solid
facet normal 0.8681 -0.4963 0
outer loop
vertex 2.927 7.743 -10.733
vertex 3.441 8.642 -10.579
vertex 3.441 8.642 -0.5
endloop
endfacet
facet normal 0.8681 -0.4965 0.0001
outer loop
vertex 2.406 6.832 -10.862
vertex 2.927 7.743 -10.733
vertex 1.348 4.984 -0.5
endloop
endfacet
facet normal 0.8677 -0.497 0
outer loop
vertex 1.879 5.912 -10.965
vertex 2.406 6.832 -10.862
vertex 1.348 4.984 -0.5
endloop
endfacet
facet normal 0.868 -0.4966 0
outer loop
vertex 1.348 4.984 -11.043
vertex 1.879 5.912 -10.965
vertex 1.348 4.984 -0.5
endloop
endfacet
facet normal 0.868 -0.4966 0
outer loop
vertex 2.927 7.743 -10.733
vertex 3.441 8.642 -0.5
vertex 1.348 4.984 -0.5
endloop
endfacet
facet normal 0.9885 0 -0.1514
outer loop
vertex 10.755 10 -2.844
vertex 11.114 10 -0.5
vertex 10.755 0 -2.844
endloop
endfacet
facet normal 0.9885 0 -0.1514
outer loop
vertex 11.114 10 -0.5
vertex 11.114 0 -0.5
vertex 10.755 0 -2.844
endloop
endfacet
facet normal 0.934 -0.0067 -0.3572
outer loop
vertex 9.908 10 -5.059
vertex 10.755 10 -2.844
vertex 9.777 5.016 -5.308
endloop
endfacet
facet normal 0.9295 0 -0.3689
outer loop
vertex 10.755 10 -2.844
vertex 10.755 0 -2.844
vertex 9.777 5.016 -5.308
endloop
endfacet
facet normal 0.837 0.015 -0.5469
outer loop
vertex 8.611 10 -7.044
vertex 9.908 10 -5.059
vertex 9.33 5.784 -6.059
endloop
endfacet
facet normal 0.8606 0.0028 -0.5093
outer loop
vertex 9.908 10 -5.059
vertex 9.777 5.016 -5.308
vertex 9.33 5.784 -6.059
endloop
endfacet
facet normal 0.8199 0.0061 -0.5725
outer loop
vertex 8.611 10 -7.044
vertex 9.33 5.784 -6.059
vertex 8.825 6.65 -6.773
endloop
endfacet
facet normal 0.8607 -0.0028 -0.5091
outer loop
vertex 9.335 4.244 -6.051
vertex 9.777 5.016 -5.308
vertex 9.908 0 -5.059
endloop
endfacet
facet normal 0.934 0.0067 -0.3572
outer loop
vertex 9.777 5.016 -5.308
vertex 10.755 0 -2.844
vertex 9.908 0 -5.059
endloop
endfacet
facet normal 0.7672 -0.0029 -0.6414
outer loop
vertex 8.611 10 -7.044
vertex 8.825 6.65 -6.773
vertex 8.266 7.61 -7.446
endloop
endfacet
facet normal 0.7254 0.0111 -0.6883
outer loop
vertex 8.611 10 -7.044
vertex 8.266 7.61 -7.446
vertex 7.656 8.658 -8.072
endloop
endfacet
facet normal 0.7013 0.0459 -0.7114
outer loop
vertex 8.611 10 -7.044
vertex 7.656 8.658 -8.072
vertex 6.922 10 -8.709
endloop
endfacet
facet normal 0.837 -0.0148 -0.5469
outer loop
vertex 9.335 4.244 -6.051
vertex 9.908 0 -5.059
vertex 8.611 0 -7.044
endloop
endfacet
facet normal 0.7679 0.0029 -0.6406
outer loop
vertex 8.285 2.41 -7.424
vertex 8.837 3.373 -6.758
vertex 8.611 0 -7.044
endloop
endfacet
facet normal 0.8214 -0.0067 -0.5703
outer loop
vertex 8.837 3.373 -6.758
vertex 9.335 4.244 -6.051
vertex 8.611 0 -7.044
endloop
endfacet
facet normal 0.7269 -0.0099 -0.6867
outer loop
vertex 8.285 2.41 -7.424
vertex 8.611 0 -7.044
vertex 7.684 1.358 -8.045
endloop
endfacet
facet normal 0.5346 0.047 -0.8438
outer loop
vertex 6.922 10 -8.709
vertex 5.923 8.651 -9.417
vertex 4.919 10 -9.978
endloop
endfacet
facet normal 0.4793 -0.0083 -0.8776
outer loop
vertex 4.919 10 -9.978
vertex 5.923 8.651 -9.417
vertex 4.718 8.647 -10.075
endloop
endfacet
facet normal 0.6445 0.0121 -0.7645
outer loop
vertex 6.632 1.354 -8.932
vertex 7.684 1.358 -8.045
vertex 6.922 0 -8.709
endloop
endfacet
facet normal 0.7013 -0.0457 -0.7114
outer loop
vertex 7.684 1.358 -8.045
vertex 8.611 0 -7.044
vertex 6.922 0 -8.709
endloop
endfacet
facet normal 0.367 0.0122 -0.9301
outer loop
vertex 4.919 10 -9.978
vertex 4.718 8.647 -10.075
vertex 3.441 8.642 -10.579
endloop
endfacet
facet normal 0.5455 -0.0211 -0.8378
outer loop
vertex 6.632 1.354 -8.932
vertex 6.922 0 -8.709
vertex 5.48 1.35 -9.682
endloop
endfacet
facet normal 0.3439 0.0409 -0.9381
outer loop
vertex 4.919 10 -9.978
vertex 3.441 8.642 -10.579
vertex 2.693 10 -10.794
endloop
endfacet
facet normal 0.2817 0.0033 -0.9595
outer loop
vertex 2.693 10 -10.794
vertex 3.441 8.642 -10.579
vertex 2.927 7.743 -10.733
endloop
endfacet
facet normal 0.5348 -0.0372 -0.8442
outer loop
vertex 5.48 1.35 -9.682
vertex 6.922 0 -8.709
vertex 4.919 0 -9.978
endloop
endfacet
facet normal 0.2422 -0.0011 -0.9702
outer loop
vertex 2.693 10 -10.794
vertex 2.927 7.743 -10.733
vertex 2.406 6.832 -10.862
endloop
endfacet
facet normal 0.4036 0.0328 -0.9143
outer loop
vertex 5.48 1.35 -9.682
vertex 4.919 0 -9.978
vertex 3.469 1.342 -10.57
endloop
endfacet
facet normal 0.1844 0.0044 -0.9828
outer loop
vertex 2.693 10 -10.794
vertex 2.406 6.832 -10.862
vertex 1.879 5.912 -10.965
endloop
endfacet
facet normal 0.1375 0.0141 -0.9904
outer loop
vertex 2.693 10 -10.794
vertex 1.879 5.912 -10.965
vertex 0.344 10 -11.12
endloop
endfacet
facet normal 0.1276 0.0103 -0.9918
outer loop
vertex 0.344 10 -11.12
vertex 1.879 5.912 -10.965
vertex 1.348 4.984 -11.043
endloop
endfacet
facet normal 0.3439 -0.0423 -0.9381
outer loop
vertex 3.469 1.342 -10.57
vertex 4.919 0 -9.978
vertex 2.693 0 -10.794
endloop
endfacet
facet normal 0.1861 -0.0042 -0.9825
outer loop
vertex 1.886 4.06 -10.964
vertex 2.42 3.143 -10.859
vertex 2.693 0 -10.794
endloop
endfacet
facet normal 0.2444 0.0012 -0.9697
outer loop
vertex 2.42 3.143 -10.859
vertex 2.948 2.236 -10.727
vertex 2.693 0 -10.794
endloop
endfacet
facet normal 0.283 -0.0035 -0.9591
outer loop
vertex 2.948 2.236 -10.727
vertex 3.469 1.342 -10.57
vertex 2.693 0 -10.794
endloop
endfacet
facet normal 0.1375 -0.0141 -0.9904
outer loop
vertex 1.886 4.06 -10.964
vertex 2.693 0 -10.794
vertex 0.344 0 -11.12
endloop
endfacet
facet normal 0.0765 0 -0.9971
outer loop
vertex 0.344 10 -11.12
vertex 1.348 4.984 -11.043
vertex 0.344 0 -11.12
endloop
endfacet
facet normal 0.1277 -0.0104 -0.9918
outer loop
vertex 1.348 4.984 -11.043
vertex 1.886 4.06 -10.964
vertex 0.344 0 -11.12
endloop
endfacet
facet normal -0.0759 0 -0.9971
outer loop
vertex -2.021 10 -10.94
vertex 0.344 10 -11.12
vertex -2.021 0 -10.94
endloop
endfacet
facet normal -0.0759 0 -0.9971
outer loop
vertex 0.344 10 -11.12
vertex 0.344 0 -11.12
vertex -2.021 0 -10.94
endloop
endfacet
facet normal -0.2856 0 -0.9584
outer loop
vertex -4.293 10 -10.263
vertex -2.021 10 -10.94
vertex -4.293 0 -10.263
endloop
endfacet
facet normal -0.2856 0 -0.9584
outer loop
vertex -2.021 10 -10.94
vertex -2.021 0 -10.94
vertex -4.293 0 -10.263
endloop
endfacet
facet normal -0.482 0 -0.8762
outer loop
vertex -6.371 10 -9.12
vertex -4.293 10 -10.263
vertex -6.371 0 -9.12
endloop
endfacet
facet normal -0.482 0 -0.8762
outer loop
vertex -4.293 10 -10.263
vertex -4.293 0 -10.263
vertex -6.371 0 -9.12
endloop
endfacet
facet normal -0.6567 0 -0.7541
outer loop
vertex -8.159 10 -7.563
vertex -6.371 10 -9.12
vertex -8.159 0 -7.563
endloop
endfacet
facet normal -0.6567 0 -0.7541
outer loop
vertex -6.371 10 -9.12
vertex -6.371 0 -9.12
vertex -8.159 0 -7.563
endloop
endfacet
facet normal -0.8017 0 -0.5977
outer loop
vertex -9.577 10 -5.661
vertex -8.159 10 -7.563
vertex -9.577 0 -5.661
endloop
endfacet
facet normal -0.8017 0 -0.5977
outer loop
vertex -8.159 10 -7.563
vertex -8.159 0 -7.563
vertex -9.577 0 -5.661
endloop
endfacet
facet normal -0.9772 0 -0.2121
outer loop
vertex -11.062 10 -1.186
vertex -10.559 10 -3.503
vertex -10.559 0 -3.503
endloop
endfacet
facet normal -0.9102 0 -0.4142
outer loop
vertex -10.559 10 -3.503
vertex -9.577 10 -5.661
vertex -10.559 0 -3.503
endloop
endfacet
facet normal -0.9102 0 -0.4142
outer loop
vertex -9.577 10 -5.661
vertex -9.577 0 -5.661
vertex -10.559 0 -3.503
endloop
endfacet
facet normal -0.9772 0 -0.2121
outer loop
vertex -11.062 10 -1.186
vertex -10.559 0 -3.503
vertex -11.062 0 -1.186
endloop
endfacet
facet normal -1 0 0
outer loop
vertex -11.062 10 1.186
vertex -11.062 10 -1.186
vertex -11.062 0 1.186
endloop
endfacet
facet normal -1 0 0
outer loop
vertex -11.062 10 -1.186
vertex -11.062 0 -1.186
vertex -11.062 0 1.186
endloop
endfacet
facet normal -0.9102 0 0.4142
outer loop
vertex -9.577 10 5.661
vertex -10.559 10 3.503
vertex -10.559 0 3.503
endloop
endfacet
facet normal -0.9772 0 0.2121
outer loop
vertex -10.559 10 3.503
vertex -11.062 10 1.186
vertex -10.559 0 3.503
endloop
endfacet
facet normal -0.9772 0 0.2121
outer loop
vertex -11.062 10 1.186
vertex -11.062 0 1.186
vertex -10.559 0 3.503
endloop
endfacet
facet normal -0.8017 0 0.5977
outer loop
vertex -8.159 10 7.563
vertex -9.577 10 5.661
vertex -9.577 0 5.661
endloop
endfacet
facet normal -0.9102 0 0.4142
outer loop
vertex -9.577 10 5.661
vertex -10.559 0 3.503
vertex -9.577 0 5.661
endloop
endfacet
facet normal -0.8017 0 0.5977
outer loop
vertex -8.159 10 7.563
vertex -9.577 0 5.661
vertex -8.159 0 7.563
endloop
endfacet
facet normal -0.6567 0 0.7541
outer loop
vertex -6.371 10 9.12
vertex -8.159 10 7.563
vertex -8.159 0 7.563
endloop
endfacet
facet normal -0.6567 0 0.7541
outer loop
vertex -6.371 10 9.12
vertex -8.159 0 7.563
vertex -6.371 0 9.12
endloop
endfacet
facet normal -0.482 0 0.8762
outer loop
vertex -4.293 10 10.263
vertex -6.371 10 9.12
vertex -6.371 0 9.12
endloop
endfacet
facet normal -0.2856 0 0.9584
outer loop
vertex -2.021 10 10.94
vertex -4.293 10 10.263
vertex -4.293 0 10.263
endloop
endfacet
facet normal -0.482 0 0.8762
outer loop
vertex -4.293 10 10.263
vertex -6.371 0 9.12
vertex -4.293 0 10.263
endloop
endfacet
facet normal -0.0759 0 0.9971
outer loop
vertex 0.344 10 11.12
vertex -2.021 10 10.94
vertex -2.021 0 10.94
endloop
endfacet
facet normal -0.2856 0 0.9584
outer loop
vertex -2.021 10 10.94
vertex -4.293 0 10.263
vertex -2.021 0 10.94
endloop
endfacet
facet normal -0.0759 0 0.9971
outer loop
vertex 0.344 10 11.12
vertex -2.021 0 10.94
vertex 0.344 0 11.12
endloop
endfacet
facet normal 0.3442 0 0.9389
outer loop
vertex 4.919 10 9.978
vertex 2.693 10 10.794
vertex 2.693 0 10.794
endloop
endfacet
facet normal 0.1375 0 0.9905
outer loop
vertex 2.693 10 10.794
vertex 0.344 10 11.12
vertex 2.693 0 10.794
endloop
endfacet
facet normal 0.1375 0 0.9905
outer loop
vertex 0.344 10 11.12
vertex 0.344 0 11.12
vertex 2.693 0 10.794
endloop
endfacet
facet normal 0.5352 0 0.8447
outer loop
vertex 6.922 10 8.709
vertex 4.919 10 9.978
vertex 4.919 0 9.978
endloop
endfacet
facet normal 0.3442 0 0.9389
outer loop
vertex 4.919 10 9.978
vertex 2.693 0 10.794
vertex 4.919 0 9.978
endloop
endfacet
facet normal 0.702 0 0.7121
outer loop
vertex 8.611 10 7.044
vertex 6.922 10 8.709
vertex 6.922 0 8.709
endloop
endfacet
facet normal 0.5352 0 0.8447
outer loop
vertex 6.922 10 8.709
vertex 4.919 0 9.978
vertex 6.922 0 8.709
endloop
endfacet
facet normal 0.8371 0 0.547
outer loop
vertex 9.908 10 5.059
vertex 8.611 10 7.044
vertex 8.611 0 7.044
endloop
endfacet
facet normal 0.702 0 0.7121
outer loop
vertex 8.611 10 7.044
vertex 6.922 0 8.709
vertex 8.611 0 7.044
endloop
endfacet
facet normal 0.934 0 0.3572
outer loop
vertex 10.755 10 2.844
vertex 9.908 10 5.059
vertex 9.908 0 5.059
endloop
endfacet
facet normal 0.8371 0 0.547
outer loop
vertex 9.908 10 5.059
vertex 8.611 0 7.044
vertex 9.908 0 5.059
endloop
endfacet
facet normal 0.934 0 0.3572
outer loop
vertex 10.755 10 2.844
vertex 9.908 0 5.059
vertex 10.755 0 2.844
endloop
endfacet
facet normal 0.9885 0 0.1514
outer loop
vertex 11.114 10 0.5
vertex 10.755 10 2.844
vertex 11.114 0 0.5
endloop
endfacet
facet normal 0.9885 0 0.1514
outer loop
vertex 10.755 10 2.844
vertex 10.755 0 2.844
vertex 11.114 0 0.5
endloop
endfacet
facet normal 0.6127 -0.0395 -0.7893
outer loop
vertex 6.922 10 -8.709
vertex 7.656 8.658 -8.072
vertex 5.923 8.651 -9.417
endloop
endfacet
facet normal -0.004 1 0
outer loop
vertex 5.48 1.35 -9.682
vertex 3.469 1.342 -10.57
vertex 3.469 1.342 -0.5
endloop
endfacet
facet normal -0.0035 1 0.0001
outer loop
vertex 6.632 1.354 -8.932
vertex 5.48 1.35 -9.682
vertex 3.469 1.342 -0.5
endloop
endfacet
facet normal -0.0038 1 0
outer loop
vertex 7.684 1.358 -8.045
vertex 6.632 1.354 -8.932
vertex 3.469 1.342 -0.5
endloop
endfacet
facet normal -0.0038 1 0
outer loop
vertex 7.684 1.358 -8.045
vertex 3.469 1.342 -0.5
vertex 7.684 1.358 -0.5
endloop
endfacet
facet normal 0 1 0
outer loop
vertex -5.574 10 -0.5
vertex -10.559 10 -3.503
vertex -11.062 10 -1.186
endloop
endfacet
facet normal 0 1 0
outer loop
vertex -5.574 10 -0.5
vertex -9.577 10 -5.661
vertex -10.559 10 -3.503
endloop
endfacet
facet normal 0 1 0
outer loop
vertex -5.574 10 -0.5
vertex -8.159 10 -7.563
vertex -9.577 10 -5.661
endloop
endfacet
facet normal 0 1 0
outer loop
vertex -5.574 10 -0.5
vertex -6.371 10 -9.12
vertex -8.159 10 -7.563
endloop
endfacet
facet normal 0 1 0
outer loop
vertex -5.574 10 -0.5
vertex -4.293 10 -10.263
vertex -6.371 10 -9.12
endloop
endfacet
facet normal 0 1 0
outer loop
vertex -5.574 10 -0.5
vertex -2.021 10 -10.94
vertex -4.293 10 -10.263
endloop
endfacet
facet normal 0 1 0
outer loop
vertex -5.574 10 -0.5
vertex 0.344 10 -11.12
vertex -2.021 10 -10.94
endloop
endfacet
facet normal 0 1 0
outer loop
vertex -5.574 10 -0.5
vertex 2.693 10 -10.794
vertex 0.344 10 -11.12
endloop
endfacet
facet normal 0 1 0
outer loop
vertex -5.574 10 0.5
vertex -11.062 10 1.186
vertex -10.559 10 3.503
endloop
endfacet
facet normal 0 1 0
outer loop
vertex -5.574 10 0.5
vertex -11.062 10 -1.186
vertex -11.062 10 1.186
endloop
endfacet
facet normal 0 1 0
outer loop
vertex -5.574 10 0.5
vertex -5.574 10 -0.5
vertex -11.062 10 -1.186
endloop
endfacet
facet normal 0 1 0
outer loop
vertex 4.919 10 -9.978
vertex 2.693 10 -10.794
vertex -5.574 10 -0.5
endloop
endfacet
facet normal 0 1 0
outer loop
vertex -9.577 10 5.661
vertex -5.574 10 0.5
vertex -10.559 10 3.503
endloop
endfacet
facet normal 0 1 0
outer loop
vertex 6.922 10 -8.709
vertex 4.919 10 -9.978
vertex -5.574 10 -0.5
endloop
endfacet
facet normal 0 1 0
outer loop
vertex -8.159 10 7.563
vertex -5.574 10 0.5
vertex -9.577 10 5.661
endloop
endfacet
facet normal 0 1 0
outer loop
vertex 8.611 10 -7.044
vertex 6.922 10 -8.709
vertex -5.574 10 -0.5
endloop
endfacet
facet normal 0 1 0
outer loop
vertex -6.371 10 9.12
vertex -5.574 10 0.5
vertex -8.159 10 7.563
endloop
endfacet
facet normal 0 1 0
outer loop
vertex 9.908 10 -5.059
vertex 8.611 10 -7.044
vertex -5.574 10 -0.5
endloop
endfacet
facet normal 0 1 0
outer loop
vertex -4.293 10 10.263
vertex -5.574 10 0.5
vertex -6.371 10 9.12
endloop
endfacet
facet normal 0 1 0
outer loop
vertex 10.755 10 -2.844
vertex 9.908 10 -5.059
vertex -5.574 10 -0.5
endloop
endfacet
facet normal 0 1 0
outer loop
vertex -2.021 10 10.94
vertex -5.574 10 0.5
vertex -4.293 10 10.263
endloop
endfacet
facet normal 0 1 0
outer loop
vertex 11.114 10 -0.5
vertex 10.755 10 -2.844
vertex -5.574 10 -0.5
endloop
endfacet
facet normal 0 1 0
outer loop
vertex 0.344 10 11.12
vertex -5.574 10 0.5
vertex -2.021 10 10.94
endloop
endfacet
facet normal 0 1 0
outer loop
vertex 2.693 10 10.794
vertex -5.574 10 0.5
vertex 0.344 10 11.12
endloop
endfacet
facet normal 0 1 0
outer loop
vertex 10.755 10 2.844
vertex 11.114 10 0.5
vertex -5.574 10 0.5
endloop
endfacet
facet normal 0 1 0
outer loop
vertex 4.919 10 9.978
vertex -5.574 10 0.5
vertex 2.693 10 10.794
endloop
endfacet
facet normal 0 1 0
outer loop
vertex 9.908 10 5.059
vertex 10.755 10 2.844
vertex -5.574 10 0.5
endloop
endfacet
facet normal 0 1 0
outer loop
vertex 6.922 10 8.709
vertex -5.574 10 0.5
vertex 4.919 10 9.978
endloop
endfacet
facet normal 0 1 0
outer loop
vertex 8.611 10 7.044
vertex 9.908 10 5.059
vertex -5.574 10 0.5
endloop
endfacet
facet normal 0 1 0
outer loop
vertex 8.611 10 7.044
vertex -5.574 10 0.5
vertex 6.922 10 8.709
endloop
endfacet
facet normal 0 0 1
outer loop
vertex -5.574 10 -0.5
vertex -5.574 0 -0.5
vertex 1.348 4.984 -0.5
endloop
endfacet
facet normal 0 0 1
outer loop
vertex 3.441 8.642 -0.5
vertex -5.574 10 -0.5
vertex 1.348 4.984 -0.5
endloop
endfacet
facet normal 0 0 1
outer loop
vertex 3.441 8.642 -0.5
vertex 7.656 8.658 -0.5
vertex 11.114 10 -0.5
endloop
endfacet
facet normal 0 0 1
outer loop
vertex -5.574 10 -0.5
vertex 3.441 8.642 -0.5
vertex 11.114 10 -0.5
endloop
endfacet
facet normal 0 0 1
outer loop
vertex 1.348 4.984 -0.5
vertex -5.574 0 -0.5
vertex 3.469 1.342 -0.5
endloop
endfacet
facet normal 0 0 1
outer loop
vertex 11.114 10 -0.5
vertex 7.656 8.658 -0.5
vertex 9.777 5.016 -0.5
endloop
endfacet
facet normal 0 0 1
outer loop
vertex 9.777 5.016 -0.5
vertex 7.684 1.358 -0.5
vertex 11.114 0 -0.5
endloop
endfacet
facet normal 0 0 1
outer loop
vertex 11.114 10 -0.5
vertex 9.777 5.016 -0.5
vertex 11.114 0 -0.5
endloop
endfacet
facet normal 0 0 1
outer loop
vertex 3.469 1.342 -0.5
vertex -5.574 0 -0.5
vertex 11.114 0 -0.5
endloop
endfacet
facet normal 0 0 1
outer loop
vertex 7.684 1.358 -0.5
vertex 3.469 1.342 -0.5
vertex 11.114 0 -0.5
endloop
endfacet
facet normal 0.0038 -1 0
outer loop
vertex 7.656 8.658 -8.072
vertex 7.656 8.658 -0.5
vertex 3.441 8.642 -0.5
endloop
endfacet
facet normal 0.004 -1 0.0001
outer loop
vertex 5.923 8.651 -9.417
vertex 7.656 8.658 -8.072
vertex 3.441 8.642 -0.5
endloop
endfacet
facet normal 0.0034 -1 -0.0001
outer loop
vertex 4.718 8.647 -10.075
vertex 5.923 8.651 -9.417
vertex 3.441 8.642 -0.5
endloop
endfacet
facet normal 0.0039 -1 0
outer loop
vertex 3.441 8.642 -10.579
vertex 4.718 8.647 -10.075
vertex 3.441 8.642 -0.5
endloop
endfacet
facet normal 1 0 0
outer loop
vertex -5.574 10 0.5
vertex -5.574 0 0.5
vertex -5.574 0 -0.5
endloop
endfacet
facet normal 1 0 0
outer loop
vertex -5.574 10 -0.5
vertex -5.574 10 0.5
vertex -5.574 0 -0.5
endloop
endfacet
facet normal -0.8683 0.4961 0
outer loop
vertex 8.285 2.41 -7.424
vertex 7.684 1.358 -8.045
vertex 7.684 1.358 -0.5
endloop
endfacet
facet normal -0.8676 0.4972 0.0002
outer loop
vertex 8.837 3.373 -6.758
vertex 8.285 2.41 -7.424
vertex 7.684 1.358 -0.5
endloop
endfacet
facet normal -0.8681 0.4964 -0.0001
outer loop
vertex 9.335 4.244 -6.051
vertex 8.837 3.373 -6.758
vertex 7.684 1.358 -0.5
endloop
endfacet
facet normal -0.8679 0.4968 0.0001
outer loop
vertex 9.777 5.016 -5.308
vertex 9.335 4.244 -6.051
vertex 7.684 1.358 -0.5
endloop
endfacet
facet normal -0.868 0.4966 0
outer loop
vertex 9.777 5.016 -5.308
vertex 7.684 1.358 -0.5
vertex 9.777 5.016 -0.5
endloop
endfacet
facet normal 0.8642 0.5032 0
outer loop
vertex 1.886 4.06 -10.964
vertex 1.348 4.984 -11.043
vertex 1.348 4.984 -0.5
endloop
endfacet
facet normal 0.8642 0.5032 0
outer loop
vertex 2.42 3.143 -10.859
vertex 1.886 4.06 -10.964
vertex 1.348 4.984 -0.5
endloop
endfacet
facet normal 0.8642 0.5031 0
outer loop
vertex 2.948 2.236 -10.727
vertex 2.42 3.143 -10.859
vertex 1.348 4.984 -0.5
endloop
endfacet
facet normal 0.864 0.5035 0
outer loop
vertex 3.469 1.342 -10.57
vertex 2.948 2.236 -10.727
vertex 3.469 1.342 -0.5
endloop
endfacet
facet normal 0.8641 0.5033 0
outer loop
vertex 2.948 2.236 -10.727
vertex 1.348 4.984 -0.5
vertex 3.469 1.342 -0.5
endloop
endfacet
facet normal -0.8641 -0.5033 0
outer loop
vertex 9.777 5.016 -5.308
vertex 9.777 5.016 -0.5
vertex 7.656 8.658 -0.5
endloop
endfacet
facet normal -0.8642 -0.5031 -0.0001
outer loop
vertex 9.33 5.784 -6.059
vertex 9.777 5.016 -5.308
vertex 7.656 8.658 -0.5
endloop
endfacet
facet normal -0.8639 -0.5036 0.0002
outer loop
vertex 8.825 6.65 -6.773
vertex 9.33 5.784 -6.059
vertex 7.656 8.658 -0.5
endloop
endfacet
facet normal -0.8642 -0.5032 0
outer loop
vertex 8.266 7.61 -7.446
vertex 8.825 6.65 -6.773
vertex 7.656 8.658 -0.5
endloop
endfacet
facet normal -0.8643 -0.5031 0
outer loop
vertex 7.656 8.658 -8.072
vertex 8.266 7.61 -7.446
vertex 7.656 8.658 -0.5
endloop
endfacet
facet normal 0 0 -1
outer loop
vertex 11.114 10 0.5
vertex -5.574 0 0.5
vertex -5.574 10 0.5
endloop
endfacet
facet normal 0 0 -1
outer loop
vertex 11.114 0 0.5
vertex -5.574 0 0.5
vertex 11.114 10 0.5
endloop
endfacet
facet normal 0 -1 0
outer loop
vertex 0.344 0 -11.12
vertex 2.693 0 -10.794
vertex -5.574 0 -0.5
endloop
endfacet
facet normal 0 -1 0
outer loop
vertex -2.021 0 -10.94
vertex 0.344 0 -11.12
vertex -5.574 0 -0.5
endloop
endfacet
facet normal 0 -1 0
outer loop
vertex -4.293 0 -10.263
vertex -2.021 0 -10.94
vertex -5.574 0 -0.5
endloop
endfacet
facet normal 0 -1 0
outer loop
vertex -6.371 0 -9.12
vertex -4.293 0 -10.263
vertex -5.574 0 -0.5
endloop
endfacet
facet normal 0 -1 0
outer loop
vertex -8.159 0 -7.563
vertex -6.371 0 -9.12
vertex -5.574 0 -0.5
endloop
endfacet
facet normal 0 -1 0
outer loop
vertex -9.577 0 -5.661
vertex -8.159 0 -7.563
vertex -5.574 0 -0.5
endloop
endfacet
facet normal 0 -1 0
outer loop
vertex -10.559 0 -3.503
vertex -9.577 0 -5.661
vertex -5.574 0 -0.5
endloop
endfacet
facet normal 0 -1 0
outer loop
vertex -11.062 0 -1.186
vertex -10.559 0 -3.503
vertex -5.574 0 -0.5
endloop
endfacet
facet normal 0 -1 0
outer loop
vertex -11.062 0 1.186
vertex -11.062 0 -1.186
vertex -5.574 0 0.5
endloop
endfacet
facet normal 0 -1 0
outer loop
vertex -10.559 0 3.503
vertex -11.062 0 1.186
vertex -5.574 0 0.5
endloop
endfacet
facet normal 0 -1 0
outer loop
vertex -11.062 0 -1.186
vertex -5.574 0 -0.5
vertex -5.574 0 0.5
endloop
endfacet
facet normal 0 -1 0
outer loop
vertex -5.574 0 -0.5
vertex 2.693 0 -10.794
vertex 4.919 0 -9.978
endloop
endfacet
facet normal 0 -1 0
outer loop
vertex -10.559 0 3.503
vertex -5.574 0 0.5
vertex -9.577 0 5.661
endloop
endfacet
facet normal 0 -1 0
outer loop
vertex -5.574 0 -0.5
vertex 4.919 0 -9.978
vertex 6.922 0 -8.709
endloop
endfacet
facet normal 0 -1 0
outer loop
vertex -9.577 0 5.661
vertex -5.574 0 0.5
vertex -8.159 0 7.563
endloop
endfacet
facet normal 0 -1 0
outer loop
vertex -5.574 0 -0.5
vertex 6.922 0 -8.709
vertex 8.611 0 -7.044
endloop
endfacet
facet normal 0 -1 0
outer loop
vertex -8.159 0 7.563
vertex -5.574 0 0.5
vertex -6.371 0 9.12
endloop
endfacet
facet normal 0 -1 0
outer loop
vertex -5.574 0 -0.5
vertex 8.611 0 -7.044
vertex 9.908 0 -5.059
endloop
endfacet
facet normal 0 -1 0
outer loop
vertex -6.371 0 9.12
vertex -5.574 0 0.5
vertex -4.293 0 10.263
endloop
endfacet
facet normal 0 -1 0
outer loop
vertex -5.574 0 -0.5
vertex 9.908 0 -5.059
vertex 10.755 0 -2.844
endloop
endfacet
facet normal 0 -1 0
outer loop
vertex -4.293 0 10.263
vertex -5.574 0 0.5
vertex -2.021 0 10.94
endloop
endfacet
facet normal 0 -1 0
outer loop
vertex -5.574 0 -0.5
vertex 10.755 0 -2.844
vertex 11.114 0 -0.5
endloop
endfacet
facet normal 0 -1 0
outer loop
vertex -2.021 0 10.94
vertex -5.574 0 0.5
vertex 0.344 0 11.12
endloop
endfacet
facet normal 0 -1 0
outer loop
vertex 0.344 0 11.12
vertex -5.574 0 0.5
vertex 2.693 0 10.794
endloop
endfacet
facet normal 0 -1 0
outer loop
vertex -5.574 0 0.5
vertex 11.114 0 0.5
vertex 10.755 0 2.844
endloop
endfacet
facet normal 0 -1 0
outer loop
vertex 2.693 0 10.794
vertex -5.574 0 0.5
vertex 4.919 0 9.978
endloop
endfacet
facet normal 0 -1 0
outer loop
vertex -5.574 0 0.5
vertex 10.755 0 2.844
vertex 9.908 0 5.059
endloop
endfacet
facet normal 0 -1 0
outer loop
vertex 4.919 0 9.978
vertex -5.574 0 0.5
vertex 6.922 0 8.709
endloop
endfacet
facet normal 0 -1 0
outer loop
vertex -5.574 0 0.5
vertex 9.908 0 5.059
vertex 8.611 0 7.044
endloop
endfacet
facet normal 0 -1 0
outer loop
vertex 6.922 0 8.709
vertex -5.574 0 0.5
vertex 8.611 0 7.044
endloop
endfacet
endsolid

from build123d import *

# Parameters (mm, degrees)
SKETCH1_R           = 11.125
BOSS_EXTRUDE1_DEPTH = 10
CUT_EXTRUDE1_DEPTH  = 19.642190054
SKETCH3_W           = 17
SKETCH3_H           = 1
CUT_EXTRUDE2_DEPTH  = 19.642190054


with BuildPart() as part:
    # Sketch1 → Boss-Extrude1 (new body)
    with BuildSketch(Plane(origin=(0, 0, 0), x_dir=(1, 0, 0), z_dir=(0, 1, 0))):
        with Locations(Location((0, 0, 0), (0, 0, 270))):
            Circle(SKETCH1_R)
    extrude(amount=BOSS_EXTRUDE1_DEPTH)

    # Sketch2 → Cut-Extrude1 (cut, through all)
    with BuildSketch(Plane.XY):
        Polygon((3.469154423, 1.341962599), (7.683780529, 1.358090851), (9.777126106, 5.016128252), (7.655845577, 8.658037401), (3.441219471, 8.641909149), (1.347873894, 4.983871748), align=None)
    extrude(amount=-CUT_EXTRUDE1_DEPTH, mode=Mode.SUBTRACT)

    # Sketch3 → Cut-Extrude2 (cut, through all)
    with BuildSketch(Plane(origin=(0, 0, 0), x_dir=(1, 0, 0), z_dir=(0, 1, 0))):
        with Locations((2.926474536, 0)):
            Rectangle(SKETCH3_W, SKETCH3_H)
    extrude(amount=CUT_EXTRUDE2_DEPTH, mode=Mode.SUBTRACT)


solid = part.part
